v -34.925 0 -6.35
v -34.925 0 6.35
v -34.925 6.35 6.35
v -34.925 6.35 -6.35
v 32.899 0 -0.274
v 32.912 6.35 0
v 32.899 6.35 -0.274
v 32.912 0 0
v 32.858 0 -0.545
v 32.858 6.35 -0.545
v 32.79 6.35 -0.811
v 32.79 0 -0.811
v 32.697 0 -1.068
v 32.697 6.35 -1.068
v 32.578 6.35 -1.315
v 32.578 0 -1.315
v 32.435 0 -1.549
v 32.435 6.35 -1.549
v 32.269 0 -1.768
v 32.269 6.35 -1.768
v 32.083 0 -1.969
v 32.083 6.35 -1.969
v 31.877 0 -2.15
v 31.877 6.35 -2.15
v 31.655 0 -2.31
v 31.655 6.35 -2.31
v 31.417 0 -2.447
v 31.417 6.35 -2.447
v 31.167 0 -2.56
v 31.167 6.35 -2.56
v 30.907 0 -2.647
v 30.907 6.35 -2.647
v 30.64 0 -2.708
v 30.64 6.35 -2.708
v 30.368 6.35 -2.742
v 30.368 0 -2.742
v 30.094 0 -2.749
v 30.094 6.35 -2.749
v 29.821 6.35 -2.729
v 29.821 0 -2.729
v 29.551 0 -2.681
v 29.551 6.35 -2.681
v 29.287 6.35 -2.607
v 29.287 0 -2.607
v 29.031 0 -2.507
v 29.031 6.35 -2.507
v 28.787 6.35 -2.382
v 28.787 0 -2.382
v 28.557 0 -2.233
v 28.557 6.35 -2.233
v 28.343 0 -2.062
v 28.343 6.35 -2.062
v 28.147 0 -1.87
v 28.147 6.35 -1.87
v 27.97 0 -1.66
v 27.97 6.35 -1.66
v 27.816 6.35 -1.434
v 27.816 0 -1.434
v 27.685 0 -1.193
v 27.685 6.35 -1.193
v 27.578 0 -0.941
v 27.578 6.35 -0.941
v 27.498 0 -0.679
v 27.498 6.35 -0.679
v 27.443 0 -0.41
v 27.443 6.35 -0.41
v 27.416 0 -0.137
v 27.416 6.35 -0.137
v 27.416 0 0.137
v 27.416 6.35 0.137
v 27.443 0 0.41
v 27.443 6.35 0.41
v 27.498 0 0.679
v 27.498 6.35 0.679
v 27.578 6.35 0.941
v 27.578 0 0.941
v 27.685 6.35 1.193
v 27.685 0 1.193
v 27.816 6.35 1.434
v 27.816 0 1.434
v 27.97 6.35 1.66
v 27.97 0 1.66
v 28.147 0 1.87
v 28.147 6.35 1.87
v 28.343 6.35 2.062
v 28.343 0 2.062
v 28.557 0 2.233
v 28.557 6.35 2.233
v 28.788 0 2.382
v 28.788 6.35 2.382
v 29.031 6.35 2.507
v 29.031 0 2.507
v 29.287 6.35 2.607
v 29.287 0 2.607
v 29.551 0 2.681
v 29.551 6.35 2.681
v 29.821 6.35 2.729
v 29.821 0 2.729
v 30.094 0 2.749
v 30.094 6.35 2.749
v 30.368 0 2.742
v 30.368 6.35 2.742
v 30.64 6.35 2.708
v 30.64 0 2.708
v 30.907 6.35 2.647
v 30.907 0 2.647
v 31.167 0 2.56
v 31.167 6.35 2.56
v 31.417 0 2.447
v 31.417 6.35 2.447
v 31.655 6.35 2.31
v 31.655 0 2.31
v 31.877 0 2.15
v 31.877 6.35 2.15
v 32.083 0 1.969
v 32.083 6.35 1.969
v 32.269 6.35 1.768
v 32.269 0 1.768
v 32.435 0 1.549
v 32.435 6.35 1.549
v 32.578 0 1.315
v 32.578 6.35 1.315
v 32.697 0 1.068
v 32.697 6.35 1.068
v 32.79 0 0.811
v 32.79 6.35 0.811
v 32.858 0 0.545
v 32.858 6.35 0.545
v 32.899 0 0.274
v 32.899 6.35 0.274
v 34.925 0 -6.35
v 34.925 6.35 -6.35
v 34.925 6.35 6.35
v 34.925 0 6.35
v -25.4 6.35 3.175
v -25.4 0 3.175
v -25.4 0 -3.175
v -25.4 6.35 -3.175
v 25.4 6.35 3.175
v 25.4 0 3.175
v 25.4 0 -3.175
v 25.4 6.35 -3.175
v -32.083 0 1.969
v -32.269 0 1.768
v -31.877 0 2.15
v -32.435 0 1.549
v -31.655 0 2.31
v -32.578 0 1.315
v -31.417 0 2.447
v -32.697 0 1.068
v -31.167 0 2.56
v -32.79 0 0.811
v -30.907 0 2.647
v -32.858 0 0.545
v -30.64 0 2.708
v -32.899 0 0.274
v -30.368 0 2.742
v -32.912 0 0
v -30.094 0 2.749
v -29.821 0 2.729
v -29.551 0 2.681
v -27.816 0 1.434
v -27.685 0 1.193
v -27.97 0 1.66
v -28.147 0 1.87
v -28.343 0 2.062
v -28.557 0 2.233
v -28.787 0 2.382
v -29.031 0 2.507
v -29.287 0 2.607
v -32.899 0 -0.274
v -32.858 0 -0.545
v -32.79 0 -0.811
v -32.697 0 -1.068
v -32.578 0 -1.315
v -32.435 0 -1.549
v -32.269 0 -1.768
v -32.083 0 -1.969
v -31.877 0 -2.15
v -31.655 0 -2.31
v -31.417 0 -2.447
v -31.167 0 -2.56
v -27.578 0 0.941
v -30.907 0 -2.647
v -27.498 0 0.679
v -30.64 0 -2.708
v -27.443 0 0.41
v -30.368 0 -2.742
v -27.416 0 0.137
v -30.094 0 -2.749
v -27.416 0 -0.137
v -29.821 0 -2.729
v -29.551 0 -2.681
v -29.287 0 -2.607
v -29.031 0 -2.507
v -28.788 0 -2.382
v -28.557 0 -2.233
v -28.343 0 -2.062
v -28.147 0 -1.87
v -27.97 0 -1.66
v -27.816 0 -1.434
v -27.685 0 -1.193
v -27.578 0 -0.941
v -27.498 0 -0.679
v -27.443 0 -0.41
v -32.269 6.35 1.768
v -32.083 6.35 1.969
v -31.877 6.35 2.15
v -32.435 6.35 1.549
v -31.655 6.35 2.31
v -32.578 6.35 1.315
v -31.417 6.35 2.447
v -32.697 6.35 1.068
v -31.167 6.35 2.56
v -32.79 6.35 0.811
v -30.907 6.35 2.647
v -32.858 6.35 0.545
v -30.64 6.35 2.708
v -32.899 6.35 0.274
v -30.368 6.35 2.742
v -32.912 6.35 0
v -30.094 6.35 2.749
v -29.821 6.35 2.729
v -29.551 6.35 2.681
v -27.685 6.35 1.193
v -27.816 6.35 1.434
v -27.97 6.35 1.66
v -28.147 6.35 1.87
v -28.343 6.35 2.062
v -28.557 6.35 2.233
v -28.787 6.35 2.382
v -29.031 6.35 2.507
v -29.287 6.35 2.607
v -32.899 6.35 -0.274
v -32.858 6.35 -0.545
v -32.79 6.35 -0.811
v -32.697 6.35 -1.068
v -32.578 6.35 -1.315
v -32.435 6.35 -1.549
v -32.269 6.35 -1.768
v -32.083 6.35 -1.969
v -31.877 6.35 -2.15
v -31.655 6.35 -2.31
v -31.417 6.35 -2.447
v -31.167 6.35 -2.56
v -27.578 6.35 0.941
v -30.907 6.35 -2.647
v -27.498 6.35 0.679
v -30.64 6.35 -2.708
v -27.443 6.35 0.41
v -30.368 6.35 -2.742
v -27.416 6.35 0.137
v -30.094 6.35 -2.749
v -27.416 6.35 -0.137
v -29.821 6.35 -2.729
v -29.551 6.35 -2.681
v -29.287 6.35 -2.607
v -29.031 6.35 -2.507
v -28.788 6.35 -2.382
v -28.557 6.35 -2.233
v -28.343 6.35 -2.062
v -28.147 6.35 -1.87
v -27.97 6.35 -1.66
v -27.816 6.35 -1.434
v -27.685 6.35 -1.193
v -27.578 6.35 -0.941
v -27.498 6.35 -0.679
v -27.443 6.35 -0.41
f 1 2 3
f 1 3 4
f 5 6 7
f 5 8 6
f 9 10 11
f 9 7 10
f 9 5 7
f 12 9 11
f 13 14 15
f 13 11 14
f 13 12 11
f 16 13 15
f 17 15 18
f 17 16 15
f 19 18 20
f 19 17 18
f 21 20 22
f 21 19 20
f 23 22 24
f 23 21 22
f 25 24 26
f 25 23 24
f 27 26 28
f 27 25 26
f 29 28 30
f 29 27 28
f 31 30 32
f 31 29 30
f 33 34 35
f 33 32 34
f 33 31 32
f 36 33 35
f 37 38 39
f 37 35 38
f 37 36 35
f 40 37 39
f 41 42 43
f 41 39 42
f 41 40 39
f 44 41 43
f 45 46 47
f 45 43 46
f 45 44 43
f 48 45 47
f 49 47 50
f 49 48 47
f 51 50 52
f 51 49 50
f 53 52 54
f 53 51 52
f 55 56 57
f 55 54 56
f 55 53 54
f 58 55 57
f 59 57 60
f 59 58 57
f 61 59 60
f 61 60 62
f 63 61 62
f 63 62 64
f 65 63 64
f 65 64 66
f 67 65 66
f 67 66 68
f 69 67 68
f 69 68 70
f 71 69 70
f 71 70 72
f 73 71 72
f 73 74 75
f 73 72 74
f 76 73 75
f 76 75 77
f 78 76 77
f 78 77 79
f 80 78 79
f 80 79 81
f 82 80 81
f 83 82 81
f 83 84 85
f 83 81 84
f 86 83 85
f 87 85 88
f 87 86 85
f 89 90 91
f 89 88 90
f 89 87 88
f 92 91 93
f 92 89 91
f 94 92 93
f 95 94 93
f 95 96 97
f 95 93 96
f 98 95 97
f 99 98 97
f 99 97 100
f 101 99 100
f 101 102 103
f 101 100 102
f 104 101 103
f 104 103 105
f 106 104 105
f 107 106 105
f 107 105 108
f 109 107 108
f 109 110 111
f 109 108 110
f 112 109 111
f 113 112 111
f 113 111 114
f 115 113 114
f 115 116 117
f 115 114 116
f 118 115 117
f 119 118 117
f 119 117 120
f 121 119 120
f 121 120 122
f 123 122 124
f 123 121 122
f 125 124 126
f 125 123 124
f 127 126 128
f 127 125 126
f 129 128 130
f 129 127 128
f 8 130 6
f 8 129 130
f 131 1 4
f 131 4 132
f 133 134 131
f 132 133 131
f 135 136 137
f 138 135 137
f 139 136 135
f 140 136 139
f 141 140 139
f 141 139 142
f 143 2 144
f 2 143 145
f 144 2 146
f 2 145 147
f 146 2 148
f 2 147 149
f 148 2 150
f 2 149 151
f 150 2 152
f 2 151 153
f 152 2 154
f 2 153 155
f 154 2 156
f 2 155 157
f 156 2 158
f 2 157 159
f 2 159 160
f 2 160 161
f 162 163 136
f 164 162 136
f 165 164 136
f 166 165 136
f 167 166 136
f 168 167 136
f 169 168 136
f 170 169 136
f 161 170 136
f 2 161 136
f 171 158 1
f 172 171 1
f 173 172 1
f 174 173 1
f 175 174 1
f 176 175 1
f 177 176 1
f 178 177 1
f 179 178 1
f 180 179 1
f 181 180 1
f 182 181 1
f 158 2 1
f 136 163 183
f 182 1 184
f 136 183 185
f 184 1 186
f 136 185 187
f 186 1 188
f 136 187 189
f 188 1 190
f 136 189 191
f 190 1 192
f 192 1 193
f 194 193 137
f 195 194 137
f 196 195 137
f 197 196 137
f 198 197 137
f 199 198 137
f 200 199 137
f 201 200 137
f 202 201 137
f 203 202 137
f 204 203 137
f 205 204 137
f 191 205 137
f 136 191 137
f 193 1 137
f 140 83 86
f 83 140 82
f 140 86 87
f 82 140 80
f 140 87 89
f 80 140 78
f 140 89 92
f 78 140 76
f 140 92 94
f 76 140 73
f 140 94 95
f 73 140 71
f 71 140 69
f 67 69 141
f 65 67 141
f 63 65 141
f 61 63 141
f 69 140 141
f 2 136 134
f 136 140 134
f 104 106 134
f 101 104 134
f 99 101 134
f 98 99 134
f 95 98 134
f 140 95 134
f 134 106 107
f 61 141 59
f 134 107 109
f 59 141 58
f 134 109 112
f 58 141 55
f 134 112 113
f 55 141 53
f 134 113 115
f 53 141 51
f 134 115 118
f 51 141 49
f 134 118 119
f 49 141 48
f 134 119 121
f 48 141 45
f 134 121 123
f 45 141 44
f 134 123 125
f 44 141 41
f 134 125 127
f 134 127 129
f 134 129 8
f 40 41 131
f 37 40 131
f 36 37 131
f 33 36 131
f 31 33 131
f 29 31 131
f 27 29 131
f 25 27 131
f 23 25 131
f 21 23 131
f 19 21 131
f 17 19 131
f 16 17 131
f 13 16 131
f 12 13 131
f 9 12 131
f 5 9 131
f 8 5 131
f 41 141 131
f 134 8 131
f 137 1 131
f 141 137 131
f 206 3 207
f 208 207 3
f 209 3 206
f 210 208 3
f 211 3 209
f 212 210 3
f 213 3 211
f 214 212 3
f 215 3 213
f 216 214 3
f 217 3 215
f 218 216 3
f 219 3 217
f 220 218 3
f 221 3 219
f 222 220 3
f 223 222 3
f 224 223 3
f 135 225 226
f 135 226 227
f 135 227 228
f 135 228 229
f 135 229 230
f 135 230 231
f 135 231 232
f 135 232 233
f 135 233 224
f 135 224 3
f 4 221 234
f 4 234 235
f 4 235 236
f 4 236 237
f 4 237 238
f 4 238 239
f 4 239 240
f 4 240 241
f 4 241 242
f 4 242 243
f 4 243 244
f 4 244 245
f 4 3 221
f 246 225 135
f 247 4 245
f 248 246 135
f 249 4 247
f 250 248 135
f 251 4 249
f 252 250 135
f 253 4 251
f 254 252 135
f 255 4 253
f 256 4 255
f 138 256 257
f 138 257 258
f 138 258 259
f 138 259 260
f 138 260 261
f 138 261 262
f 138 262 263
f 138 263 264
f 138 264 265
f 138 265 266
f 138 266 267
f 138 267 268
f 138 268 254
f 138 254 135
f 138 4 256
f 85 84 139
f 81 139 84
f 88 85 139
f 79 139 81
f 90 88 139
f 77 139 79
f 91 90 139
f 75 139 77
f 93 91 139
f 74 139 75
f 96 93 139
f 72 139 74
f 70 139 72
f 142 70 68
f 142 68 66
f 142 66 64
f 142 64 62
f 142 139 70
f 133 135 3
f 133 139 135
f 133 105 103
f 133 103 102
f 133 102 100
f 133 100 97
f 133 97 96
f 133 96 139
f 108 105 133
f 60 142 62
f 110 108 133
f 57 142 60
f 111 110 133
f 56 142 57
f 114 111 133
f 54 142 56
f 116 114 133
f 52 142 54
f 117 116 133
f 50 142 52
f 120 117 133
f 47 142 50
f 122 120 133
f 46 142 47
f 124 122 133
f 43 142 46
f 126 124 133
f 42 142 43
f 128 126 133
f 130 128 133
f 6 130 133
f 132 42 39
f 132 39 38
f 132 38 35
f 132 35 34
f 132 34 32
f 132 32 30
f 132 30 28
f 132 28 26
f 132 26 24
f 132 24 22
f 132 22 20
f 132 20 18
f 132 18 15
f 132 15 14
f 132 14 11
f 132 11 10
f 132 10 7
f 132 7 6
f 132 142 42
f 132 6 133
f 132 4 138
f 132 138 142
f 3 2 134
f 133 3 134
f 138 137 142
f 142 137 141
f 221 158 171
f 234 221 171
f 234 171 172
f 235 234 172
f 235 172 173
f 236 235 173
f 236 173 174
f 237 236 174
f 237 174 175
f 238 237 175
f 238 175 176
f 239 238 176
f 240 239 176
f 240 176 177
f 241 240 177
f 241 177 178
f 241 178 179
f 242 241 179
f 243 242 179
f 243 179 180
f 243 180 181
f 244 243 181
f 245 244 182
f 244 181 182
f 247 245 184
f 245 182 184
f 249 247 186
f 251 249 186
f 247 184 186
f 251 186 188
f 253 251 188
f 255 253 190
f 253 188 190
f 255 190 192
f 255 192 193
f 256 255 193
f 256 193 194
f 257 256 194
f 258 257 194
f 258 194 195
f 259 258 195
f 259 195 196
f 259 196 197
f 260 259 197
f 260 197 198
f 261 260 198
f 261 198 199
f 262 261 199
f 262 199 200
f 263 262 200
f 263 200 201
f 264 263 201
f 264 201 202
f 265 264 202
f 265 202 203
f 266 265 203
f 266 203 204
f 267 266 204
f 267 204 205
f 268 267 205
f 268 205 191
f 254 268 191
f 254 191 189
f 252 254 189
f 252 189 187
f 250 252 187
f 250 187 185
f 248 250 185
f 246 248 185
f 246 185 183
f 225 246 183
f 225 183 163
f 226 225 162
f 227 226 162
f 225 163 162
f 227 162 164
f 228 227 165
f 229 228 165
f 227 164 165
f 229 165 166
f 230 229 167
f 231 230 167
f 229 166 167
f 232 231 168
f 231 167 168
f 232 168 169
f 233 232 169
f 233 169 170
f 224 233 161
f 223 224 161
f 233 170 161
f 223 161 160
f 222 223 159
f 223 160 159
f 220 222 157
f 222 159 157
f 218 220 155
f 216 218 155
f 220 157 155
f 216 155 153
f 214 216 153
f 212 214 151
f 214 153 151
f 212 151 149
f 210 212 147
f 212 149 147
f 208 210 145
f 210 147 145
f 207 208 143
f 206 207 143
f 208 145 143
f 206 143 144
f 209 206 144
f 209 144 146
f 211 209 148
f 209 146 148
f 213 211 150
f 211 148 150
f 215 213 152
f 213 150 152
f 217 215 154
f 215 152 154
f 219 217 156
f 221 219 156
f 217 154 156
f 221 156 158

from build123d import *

# Parameters (mm, degrees)
SKETCH1_W            = 69.85
SKETCH1_H            = 12.7
SKETCH1_W_2          = 50.8
SKETCH1_H_2          = 6.35
BOSS_EXTRUDE1_DEPTH  = 6.35
M5_CLEARANCE_HOLE1_D = 5.5


with BuildPart() as part:
    # Sketch1 → Boss-Extrude1 (new body)
    with BuildSketch(Plane(origin=(0, 0, 0), x_dir=(1, 0, 0), z_dir=(0, 1, 0))):
        Rectangle(SKETCH1_W, SKETCH1_H)
        Rectangle(SKETCH1_W_2, SKETCH1_H_2, mode=Mode.SUBTRACT)
    extrude(amount=BOSS_EXTRUDE1_DEPTH)

    # M5 Clearance Hole1 (through all)
    with Locations(Plane(origin=(0, 6.35, 0), x_dir=(1, 0, 0), z_dir=(0, 1, 0))):
        with Locations((-30.1625, 0)):
            m5_clearance_hole1 = Hole(M5_CLEARANCE_HOLE1_D / 2)

    # Mirror1: M5 Clearance Hole1 across plane
    add(m5_clearance_hole1.mirror(Plane(origin=(0, 0, 0), x_dir=(0, 0, 1), z_dir=(1, 0, 0))), mode=Mode.SUBTRACT)


solid = part.part
